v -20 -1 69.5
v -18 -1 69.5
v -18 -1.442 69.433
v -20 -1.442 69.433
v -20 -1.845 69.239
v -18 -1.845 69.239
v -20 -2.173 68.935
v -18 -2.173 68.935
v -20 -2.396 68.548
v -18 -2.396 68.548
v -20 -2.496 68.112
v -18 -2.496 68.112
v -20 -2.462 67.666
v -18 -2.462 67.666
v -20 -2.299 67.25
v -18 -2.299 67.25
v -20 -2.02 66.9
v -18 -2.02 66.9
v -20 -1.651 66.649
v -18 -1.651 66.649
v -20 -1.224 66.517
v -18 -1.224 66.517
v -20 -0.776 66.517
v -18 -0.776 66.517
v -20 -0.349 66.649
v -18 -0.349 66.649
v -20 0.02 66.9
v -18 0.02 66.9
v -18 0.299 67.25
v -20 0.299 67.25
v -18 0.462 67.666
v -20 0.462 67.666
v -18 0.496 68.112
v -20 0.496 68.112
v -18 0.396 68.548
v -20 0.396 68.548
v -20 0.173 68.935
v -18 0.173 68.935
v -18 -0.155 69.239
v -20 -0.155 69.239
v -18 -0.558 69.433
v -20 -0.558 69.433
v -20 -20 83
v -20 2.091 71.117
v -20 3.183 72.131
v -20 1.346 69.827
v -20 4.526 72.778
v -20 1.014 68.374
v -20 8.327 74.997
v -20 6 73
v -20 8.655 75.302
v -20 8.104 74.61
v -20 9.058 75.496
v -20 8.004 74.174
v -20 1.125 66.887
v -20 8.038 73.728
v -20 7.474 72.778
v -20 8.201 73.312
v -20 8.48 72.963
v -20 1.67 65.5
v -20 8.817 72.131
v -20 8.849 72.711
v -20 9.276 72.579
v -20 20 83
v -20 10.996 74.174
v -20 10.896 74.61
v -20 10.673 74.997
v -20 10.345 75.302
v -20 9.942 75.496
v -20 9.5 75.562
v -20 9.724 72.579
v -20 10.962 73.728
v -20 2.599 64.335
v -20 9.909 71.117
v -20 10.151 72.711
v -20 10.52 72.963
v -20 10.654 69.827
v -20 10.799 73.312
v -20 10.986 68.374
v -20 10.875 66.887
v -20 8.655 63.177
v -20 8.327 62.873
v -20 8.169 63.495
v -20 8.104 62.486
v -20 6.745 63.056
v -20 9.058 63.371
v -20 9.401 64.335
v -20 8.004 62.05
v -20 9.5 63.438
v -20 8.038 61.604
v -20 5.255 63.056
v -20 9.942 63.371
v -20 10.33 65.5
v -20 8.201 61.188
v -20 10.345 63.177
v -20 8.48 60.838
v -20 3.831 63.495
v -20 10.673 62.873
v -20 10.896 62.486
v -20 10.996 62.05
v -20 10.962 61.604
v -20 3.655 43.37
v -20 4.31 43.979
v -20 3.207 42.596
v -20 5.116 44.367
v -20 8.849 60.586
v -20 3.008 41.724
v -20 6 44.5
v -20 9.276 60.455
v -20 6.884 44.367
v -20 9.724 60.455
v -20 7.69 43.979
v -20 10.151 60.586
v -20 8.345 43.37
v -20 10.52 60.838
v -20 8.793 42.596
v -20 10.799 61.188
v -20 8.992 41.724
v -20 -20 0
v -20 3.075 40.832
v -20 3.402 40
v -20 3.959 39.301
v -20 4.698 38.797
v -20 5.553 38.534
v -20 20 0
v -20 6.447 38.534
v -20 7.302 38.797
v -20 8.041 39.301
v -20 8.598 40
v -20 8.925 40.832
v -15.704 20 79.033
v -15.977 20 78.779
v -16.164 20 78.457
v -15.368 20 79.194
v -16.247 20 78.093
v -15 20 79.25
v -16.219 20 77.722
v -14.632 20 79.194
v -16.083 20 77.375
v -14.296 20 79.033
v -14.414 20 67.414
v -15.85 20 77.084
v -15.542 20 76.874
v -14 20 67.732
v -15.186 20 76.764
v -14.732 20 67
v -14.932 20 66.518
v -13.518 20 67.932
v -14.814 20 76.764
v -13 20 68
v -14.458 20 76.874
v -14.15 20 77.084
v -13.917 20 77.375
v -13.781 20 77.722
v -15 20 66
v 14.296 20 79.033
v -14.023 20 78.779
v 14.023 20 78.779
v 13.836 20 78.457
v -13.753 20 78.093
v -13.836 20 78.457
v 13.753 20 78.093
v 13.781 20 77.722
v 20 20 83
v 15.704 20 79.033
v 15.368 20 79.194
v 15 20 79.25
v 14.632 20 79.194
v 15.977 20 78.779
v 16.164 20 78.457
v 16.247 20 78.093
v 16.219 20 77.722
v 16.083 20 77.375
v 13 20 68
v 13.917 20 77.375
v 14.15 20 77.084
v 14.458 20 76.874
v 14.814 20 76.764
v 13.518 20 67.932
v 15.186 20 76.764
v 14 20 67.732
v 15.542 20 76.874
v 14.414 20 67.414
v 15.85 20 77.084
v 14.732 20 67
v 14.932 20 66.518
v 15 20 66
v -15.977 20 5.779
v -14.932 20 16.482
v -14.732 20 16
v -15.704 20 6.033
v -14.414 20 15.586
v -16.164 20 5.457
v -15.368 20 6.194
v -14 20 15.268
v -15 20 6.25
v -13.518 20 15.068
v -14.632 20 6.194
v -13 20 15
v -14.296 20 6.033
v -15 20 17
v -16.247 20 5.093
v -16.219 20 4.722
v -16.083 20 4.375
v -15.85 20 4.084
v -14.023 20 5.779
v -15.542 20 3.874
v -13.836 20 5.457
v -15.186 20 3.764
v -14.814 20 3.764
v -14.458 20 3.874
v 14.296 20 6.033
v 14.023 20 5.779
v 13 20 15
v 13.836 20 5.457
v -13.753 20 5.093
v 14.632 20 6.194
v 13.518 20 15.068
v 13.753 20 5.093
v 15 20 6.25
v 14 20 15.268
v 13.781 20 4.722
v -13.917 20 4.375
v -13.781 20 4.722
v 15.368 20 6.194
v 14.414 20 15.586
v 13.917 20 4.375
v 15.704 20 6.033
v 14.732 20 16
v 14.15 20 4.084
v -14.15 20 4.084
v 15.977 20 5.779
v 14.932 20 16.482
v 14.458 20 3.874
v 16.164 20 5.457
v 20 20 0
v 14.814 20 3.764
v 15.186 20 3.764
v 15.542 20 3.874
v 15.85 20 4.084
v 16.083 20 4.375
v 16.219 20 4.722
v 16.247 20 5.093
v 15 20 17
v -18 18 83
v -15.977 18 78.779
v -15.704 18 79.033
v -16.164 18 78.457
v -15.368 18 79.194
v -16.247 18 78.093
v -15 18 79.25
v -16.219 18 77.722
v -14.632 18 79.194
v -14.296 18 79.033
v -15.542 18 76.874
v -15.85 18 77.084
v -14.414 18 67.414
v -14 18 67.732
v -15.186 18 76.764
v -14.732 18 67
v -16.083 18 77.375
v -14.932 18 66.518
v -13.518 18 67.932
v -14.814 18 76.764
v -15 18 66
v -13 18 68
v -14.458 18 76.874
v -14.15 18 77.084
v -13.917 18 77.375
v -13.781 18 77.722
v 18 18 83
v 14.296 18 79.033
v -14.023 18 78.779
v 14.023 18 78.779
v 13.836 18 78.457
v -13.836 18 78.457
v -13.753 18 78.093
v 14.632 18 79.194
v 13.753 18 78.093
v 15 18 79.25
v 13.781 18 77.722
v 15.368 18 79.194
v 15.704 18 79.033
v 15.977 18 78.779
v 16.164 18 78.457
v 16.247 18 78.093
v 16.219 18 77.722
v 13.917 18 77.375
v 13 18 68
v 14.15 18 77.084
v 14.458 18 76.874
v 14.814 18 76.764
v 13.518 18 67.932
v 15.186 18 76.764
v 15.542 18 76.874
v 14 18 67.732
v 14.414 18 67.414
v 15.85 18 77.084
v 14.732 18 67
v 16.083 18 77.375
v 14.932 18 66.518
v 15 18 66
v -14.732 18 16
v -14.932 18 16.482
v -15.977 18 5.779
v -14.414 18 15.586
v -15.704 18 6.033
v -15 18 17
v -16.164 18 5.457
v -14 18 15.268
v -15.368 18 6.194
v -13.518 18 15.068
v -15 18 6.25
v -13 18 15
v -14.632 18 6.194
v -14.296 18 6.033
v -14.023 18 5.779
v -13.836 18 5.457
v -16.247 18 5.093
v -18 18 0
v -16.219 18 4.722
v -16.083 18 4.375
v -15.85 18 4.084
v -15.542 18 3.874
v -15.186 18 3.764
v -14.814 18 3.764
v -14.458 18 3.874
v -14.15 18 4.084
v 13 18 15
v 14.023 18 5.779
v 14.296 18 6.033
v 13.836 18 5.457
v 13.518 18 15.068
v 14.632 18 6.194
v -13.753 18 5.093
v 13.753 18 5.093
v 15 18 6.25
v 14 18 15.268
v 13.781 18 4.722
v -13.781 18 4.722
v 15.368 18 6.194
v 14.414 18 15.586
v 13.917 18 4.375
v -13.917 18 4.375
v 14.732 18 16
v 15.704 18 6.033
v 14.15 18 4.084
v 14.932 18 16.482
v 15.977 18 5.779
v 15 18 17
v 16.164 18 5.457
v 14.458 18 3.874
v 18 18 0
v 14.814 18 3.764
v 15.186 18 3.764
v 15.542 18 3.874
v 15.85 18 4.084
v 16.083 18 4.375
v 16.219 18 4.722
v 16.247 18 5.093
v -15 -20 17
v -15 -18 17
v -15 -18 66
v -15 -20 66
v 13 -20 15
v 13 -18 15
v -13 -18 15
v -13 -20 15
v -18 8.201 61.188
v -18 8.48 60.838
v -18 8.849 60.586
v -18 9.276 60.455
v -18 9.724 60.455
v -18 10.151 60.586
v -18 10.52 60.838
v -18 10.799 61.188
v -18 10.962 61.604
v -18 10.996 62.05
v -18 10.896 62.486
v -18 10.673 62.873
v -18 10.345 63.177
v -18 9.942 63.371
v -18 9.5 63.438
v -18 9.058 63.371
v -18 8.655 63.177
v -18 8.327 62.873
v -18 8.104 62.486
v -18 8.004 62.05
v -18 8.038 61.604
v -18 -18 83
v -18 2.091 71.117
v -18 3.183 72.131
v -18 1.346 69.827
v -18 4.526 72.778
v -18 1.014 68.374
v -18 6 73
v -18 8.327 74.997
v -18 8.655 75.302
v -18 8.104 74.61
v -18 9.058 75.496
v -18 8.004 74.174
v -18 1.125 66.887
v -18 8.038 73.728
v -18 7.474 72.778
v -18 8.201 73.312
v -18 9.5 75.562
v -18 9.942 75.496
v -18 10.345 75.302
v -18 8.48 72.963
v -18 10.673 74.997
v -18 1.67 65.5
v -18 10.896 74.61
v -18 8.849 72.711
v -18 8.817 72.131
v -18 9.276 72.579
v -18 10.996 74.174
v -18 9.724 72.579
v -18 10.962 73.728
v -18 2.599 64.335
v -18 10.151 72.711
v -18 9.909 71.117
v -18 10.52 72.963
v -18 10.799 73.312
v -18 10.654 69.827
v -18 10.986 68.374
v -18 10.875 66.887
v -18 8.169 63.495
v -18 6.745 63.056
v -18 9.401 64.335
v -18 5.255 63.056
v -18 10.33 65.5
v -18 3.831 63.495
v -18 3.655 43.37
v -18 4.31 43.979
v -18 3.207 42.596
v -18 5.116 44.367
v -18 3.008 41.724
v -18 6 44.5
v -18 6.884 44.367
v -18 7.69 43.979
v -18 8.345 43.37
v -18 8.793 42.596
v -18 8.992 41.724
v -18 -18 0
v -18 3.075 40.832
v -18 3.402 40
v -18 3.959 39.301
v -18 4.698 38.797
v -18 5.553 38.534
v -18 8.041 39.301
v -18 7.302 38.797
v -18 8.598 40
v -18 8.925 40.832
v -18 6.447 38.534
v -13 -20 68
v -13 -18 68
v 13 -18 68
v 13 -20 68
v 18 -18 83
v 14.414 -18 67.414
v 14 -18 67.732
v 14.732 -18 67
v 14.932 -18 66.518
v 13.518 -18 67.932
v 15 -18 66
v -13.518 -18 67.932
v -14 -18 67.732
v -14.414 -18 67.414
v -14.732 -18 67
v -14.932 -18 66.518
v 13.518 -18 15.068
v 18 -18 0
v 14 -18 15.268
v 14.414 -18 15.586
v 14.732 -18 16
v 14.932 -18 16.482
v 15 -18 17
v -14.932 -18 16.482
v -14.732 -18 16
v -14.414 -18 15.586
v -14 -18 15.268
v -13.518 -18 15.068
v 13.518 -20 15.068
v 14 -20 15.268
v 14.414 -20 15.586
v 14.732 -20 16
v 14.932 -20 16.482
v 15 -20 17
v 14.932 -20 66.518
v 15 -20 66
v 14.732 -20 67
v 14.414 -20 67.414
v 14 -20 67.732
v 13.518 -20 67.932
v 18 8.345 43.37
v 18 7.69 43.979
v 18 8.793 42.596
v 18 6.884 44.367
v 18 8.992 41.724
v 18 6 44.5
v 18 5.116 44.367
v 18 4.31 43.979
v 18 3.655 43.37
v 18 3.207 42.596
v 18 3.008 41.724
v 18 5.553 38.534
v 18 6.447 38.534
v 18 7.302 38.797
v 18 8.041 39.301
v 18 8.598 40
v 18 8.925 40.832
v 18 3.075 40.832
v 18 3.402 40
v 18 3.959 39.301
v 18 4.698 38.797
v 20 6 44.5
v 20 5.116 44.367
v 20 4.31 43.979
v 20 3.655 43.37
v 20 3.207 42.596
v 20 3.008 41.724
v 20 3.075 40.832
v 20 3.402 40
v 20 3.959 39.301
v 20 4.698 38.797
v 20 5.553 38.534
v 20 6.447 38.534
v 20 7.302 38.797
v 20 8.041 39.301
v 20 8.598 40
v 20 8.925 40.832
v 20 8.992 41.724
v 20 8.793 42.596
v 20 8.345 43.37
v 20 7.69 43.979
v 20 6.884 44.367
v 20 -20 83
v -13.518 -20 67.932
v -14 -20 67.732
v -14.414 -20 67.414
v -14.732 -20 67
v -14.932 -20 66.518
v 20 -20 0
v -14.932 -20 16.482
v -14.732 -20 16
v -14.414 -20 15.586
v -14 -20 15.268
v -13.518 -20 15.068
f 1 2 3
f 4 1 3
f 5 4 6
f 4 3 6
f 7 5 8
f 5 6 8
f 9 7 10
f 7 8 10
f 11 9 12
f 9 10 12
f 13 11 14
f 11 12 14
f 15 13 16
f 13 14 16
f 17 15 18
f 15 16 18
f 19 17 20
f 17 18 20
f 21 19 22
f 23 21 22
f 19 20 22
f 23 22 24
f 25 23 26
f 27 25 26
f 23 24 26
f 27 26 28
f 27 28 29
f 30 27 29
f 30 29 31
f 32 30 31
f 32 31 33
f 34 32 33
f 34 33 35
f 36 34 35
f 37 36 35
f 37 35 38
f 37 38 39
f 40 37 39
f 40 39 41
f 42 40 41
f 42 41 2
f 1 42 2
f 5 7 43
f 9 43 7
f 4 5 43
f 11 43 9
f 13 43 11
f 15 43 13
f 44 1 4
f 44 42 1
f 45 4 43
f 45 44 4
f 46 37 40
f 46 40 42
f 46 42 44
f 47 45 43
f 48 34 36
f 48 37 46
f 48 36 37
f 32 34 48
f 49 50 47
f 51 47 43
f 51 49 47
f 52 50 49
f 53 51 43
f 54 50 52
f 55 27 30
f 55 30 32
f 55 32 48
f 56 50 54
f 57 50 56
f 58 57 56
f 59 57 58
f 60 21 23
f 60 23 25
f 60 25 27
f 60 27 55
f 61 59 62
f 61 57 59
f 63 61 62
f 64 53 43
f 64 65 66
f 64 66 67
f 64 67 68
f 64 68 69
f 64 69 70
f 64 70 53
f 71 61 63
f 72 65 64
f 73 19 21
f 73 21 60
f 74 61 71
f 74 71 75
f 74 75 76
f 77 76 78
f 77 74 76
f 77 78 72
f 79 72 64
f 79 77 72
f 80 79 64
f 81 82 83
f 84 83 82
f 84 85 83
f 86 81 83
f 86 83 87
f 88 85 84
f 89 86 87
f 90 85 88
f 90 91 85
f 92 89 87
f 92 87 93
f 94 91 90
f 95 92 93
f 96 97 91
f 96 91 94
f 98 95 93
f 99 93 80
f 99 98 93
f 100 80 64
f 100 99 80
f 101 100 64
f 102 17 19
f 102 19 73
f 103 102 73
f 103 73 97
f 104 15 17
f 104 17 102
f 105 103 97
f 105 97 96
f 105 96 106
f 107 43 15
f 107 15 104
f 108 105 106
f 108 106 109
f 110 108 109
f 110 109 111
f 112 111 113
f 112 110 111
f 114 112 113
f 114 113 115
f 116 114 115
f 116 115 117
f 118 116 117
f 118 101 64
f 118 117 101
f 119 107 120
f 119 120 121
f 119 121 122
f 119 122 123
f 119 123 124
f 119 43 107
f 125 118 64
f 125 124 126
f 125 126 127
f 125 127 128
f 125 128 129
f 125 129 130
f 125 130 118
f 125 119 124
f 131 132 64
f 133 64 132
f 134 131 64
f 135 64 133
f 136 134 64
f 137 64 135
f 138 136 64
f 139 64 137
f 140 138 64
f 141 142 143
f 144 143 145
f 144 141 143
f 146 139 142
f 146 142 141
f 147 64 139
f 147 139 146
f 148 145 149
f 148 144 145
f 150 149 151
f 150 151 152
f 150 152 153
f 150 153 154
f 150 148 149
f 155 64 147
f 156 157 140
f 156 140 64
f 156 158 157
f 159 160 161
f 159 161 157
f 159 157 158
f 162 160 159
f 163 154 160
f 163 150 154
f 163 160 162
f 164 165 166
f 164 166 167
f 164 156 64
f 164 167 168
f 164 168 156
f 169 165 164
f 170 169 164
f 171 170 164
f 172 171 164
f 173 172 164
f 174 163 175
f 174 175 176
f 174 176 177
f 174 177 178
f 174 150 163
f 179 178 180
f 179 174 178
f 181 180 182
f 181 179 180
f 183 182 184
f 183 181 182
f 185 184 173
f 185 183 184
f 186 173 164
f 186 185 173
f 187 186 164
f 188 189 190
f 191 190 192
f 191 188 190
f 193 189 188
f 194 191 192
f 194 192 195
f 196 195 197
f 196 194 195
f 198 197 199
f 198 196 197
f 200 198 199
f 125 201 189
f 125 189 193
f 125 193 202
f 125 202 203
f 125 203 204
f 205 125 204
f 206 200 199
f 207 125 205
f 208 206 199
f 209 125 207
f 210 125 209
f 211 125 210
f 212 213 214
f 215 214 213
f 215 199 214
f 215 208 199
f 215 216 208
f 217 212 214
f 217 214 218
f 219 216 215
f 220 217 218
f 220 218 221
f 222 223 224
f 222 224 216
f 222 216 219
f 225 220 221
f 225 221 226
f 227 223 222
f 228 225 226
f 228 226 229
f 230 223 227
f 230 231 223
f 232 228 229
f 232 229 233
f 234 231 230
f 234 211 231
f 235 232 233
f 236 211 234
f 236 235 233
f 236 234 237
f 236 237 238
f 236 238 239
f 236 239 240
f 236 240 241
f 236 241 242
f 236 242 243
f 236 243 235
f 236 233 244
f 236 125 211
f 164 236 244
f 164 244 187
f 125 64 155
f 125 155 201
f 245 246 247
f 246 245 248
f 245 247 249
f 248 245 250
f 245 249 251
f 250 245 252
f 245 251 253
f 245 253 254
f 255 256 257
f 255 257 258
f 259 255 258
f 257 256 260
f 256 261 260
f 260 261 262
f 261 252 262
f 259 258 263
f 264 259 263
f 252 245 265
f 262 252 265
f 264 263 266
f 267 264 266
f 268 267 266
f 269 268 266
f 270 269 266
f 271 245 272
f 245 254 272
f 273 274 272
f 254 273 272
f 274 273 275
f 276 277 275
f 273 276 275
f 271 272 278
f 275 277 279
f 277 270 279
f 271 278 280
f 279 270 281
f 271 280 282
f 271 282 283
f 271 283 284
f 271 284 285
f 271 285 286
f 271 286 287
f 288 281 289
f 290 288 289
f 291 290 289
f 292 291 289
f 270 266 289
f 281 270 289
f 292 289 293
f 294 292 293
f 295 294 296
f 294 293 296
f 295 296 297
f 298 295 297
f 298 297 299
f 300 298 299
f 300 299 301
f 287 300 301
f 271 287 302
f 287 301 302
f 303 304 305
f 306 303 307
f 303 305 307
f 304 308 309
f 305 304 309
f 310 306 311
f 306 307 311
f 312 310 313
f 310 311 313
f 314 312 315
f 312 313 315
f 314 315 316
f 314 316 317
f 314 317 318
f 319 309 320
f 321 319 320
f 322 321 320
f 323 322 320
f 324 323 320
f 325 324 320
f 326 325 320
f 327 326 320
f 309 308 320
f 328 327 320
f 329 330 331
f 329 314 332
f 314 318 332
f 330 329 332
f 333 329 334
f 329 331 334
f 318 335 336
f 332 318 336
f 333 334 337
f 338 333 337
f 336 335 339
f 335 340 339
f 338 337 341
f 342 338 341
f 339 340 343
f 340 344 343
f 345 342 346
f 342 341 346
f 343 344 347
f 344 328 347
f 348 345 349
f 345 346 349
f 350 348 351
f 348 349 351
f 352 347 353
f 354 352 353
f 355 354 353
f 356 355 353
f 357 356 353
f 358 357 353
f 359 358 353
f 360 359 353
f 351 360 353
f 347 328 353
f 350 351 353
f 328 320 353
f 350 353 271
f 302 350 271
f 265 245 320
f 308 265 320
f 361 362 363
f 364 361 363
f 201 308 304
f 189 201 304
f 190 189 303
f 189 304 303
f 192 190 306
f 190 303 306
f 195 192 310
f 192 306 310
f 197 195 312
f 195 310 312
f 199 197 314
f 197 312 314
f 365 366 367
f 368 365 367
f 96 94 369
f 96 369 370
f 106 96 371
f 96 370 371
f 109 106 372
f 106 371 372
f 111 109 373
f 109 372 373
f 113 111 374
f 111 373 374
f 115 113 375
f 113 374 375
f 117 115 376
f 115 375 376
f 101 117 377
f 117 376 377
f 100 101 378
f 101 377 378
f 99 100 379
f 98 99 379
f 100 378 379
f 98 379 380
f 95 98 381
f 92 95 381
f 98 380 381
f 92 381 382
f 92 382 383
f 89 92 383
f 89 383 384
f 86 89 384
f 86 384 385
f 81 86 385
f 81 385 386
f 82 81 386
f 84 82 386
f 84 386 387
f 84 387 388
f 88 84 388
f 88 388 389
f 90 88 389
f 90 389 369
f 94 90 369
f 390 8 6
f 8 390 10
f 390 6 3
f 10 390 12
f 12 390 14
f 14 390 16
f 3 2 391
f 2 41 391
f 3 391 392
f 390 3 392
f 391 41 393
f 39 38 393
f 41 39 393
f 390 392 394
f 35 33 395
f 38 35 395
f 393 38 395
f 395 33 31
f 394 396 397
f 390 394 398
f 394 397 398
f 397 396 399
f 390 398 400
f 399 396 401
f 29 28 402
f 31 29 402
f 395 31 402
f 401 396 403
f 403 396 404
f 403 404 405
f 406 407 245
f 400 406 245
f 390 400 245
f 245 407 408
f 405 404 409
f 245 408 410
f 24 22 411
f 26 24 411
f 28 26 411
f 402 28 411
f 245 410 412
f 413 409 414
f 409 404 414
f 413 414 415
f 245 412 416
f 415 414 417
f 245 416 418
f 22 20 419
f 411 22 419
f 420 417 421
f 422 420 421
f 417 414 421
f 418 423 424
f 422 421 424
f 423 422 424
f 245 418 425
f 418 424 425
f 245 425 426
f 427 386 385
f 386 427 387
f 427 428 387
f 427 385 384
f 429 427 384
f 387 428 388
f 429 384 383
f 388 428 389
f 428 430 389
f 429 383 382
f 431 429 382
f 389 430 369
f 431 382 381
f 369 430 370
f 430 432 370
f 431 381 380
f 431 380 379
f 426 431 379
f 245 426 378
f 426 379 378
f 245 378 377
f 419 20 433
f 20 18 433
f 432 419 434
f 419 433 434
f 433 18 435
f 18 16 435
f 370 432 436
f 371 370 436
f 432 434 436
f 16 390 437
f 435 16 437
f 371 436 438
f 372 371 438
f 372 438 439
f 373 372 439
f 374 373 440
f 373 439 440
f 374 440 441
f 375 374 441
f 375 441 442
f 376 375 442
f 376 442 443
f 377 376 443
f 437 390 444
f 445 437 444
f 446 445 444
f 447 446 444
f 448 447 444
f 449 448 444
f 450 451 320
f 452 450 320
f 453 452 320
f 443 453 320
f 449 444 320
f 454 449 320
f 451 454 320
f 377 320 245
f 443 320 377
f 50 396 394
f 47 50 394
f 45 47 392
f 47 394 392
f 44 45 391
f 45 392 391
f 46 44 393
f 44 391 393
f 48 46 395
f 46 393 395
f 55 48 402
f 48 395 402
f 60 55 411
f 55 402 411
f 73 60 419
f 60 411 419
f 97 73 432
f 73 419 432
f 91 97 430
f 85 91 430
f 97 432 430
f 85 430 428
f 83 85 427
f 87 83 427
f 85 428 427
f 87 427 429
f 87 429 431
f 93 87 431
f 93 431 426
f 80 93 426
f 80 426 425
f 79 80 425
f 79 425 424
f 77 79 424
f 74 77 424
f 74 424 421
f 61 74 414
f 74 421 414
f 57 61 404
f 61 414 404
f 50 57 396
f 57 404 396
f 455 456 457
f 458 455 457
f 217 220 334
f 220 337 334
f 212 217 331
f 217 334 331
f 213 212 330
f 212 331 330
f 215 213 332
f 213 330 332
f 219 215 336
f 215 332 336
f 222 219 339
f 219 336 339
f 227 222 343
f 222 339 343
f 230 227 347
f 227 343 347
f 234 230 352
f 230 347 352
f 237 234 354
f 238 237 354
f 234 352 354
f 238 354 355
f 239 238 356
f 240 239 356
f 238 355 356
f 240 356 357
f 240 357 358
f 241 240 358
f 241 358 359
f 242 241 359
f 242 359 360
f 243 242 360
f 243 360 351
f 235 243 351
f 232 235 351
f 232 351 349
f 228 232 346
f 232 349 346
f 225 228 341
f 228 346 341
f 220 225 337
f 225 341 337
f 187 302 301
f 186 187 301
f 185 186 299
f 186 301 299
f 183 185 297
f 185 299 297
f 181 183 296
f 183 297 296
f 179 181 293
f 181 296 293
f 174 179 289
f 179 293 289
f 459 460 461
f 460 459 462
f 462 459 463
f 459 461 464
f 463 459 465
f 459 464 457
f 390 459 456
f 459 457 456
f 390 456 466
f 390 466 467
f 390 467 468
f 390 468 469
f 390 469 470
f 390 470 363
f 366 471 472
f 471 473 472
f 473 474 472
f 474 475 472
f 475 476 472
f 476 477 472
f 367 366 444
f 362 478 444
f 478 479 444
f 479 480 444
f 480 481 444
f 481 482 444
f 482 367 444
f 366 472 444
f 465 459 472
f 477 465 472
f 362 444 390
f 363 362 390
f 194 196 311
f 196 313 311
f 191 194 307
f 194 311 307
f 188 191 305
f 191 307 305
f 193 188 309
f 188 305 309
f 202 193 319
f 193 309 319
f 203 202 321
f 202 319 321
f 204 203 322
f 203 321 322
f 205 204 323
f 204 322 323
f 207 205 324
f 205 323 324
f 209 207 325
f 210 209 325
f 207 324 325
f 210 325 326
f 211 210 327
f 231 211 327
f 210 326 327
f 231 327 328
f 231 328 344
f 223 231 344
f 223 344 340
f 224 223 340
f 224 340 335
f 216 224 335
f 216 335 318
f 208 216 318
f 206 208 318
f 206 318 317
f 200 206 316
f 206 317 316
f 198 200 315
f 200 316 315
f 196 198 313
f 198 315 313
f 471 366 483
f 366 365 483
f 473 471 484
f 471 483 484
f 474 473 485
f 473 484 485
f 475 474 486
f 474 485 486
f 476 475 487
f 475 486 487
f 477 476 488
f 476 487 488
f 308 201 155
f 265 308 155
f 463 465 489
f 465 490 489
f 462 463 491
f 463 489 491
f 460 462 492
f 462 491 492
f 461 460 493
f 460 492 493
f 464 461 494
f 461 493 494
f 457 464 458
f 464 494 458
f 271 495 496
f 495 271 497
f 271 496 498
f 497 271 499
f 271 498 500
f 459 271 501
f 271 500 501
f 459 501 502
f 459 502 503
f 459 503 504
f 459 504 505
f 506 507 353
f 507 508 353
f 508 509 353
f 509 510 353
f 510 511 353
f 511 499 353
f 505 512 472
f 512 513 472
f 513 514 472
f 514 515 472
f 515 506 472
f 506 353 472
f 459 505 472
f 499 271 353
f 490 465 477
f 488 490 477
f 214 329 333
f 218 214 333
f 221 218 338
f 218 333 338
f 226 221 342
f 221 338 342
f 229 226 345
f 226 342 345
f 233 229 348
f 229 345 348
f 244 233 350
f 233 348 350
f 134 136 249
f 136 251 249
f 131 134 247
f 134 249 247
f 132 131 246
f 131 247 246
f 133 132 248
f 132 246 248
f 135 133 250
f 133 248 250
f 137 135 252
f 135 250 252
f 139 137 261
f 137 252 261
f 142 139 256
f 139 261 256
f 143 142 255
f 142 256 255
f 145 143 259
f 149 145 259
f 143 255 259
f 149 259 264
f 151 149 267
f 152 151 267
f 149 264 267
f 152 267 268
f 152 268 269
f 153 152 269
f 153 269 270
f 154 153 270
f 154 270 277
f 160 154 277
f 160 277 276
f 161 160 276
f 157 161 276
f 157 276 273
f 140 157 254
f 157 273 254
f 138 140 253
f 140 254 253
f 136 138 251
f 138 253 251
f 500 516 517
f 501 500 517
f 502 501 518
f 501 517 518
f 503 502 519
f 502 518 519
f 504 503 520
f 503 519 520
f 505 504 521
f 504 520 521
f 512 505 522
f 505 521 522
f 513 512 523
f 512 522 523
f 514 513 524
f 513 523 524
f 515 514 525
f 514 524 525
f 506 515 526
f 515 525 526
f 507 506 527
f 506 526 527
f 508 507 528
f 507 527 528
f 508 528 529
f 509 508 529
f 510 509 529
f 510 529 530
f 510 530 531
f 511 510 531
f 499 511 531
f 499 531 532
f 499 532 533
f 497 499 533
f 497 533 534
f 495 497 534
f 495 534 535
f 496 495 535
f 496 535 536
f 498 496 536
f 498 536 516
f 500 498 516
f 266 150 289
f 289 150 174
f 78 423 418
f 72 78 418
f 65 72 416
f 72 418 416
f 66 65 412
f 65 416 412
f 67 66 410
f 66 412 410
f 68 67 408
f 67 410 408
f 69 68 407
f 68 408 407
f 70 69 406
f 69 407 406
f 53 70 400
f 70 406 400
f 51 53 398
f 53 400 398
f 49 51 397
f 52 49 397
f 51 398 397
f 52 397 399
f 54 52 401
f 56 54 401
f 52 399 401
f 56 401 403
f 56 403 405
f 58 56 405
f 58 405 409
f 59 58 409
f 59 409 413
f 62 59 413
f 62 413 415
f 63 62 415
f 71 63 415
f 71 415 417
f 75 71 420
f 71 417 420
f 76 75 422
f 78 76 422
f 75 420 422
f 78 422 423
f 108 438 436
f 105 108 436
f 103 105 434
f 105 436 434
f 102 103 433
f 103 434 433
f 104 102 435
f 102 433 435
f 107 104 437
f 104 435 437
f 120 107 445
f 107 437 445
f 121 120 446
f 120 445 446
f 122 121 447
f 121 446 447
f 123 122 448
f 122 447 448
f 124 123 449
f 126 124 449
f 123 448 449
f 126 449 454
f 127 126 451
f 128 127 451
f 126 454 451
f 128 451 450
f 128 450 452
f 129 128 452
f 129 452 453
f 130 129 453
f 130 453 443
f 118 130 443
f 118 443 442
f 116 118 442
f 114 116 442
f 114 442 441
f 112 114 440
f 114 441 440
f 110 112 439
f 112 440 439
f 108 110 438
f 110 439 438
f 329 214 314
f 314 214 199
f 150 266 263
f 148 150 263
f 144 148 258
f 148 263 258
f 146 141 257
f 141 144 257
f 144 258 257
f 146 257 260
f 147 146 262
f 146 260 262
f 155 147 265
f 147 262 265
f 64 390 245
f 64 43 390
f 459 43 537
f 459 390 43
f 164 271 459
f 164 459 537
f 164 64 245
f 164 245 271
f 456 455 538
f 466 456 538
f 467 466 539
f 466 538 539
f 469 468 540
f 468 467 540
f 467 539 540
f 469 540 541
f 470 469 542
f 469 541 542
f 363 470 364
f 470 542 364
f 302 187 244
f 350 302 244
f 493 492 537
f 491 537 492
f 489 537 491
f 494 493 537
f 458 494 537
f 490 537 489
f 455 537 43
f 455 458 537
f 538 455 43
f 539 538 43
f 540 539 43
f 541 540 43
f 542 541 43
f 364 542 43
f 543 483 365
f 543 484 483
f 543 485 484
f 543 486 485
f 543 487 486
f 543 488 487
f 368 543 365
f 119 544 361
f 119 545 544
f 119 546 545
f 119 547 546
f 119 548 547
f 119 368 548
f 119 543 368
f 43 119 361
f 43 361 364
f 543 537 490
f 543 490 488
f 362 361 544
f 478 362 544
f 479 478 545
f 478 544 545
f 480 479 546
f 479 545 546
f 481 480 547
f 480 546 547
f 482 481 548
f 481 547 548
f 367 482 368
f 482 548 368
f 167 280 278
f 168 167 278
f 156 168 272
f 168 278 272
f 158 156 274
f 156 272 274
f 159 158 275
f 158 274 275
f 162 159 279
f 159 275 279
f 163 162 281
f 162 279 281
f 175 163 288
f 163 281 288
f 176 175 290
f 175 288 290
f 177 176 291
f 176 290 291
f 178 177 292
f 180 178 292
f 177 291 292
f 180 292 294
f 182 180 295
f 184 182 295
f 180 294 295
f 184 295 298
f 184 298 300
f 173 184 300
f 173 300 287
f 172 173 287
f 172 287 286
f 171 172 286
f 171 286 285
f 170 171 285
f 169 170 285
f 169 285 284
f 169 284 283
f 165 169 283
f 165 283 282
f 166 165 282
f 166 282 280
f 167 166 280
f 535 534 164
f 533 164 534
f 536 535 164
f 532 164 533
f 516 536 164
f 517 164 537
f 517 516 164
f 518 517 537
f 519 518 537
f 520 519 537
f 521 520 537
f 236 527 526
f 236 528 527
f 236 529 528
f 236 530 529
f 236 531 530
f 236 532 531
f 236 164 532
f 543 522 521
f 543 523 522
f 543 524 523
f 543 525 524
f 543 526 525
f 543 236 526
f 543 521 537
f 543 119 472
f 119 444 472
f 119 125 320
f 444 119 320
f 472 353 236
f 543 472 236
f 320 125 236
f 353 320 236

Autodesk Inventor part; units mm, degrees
ref_plane "YZ Plane" through (0, 0, 0) normal (1, 0, 0) x (0, 1, 0)
ref_plane "XZ Plane" through (0, 0, 0) normal (0, 1, 0) x (-1, 0, 0)
ref_plane "XY Plane" through (0, 0, 0) normal (0, 0, 1) x (1, 0, 0)
sketch "スケッチ1" plane through (0, 0, 0) normal (0, 0, 1) x (1, 0, 0)
  line L0 (-20, 20) -> (20, 20)
  line L1 (20, 20) -> (20, -20)
  line L2 (20, -20) -> (-20, -20)
  line L3 (-20, -20) -> (-20, 20)
  line L4 (-20, 20) -> (20, -20) construction
  line L5 (20, 20) -> (-20, -20) construction
  line L6 (-18, 18) -> (18, 18)
  line L7 (18, 18) -> (18, -18)
  line L8 (18, -18) -> (-18, -18)
  line L9 (-18, -18) -> (-18, 18)
  line L10 (-18, 18) -> (18, -18) construction
  line L11 (18, 18) -> (-18, -18) construction
  point P0 (0, 0)
  point P1 (0, 0)
  dimension "d0" = 40
  dimension "d1" = 40
  dimension "d2" = 2
  dimension "d3" = 2
extrude "押し出し1" add sketch "スケッチ1" along normal blind 83
sketch "スケッチ3" plane through (-20, 20, 0) normal (0, 1, 0) x (1, 0, 0)
  line L0 (5, -68) -> (35, -68)
  line L1 (35, -68) -> (35, -15)
  line L2 (35, -15) -> (5, -15)
  line L3 (5, -15) -> (5, -68)
  line L4 (40, -83) -> (0, -83) projected
  line L5 (0, 0) -> (40, 0) projected
  line L6 (40, 0) -> (40, -83) projected
  line L7 (0, 0) -> (0, -83) projected
  point P0 (20, 0)
  dimension "d6" = 15
  dimension "d7" = 15
  dimension "d8" = 5
  dimension "d9" = 5
extrude "押し出し2" cut sketch "スケッチ3" against normal blind 100 contours L3 L2 L1 L0
fillet "フィレット1" radius 2 8 edges at (-15, 19, 68) (-15, 19, 15) (15, 19, 15) (15, 19, 68) (15, -19, 68) (-15, -19, 68) (-15, -19, 15) (15, -19, 15)
sketch "スケッチ4" plane through (-20, 20, 0) normal (0, 1, 0) x (1, 0, 0)
  line L0 (0, 0) -> (0, -83) projected
  line L1 (0, 0) -> (40, 0) projected
  line L2 (40, 0) -> (40, -83) projected
  line L3 (40, -83) -> (0, -83) projected
  point P0 (20, 0)
  point P1 (5, -5)
  point P2 (5, -78)
  point P3 (35, -78)
  point P4 (35, -5)
  dimension "d13" = 5
  dimension "d14" = 5
  dimension "d15" = 5
  dimension "d16" = 5
  dimension "d17" = 5
  dimension "d18" = 5
  dimension "d19" = 5
  dimension "d20" = 5
hole "穴1" at (-15, 20, 5) at (-15, 20, 78) at (15, 20, 78) at (15, 20, 5) direction (0, -1, 0) diameter 2.5 end up to surface
thread "ねじ1" size "M2.5x0.45" class "6H" standard "ANSI Metric M Profile" full length
thread "ねじ2" size "M2.5x0.45" class "6H" standard "ANSI Metric M Profile" full length
thread "ねじ3" size "M2.5x0.45" class "6H" standard "ANSI Metric M Profile" full length
thread "ねじ4" size "M2.5x0.45" class "6H" standard "ANSI Metric M Profile" full length
sketch "スケッチ6" plane through (-20, -20, 0) normal (-1, 0, 0) x (0, 0, 1)
  line L0 (0, 0) -> (0, 40) projected
  line L1 (0, 40) -> (83, 40) projected
  line L2 (83, 40) -> (83, 0) projected
  point P0 (0, 20)
  point P1 (68, 26)
  dimension "d46" = 14
  dimension "d54" = 15
hole "穴3" at (-20, 6, 68) direction (1, 0, 0) diameter 10 depth 8
sketch "スケッチ7" plane through (-20, -20, 0) normal (-1, 0, 0) x (0, 0, 1)
  line L0 (0, 40) -> (83, 40) projected
  line L1 (83, 40) -> (83, 0) projected
  point P0 (0, 20)
  point P1 (68, 19)
  dimension "d55" = 21
  dimension "d56" = 15
hole "穴4" at (-20, -1, 68) direction (1, 0, 0) diameter 3 depth 8
pattern_circular "円形状パターン1" count 3 over 360 about axis through (-16, 6, 68) along (-1, 0, 0) of "穴4"
sketch "スケッチ8" plane through (-20, -20, 0) normal (-1, 0, 0) x (0, 0, 1)
  line L0 (83, 40) -> (83, 0) projected
  line L1 (0, 0) -> (83, 0) projected
  line L2 (0, 40) -> (83, 40) projected
  circle A0 centre (68, 26) radius 5 projected
  point P0 (0, 20)
  point P1 (41.5, 26)
  dimension "d77" = 14
  dimension "d78" = 26.5
hole "穴5" at (-20, 6, 41.5) direction (1, 0, 0) diameter 6 end through all
properties part number "Gear box改" material "アルミニウム"
